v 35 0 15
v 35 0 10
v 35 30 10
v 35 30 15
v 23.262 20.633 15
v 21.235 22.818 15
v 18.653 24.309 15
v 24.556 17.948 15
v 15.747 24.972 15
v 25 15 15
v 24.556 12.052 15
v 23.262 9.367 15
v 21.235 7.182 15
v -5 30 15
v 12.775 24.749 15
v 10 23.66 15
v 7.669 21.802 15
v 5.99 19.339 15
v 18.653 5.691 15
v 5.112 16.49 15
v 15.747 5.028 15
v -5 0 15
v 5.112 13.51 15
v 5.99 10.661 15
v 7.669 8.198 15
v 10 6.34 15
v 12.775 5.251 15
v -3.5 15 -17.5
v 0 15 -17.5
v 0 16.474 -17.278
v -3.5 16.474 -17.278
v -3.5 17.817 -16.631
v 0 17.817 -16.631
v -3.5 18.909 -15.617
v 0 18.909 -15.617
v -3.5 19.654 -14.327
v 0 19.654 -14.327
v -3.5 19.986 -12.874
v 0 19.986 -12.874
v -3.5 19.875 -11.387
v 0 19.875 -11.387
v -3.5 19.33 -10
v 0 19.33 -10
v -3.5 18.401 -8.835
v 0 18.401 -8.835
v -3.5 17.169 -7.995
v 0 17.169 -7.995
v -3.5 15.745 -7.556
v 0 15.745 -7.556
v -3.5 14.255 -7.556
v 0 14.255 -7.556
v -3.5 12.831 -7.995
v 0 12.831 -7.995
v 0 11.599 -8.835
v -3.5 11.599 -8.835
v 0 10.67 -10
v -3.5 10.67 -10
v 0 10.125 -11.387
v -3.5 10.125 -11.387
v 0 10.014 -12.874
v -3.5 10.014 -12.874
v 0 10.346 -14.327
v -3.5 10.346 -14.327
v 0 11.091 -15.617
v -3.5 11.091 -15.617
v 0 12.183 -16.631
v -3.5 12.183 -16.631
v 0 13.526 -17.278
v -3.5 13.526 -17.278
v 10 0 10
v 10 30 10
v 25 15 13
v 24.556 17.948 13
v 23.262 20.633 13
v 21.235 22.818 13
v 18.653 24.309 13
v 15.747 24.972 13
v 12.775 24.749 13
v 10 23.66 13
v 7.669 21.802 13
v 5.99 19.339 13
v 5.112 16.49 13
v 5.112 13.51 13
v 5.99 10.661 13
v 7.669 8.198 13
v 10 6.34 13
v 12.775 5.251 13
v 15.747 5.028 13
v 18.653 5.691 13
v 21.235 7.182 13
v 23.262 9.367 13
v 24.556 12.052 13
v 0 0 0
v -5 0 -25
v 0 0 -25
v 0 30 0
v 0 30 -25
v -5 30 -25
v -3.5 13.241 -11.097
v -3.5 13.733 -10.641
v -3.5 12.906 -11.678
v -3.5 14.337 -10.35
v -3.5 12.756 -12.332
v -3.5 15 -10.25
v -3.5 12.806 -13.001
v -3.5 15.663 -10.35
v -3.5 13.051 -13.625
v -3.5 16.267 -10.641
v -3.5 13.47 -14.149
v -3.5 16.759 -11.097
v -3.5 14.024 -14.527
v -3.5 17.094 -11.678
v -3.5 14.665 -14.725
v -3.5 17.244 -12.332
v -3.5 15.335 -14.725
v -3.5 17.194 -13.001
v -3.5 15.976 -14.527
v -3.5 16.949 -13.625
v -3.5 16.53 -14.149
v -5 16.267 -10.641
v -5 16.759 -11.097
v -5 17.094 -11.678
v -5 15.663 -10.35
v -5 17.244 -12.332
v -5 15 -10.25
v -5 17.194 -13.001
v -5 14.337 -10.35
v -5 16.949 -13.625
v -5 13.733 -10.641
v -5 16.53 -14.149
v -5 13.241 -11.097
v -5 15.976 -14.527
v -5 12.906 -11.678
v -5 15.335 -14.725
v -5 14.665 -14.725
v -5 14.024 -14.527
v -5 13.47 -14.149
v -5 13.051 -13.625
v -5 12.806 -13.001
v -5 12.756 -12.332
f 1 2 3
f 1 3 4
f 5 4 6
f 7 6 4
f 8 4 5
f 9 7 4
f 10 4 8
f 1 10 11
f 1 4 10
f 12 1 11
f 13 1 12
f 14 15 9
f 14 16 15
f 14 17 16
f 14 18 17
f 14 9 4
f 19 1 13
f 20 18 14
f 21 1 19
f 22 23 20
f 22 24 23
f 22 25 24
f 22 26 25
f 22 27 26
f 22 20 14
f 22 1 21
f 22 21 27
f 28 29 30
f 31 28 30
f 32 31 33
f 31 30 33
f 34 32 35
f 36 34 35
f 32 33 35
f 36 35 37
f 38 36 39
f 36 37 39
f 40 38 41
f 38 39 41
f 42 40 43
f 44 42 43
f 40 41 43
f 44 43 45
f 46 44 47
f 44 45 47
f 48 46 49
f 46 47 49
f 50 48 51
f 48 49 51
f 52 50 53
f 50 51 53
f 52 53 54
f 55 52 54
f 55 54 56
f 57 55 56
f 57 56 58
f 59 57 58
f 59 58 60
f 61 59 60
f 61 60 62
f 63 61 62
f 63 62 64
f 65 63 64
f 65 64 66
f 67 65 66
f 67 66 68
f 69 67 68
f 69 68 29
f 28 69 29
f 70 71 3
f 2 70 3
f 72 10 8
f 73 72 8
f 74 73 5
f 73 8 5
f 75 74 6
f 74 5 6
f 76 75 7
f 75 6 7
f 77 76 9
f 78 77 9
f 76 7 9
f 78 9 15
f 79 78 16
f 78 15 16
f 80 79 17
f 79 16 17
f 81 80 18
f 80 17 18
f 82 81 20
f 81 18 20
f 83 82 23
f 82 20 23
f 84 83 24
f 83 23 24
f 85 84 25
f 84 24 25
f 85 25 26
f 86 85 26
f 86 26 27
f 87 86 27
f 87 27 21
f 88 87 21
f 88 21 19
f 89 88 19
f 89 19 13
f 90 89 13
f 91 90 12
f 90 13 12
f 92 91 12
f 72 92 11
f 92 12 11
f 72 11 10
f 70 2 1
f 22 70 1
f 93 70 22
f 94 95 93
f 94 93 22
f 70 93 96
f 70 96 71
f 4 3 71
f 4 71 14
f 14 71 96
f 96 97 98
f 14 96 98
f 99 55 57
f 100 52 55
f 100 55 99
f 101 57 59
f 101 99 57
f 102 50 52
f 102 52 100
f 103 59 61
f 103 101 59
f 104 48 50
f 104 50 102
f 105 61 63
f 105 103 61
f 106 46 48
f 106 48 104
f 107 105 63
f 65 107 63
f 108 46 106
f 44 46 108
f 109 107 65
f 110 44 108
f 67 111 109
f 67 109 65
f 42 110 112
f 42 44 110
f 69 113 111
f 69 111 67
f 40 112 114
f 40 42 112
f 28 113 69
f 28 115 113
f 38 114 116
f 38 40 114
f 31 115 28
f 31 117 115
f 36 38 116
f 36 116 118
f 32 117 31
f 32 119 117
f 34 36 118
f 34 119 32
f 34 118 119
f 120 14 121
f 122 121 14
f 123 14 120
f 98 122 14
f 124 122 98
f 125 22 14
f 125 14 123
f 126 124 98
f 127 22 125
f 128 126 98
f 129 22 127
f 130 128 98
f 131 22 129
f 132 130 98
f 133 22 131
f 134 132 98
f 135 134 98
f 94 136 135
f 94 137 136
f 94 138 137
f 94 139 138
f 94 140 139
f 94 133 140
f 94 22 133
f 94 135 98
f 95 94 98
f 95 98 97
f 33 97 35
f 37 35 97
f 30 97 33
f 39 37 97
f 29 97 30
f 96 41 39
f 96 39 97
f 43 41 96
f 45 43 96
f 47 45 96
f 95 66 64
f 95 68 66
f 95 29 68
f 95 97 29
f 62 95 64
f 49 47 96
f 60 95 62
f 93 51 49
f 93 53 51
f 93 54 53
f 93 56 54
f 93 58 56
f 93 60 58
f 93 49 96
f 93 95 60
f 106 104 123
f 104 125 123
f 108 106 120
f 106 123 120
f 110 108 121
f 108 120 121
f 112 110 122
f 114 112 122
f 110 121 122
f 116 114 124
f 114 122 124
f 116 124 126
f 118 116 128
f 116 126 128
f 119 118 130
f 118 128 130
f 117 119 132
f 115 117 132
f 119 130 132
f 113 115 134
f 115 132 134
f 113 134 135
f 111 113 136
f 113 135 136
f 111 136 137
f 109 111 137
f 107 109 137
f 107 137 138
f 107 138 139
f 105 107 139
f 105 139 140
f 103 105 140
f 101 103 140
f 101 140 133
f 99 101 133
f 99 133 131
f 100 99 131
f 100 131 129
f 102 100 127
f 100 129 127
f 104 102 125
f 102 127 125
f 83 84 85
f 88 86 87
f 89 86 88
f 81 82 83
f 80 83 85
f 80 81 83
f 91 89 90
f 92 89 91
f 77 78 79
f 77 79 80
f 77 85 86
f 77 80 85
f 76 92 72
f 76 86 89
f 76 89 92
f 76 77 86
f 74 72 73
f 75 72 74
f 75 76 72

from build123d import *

# Parameters (mm, degrees)
ESTRUSIONE_ESTRUSIONE2_DEPTH                         = 30
FORO_LAMATO_PER_VITE_M4_A_TESTA_CILINDRI_D           = 4.5
FORO_LAMATO_PER_VITE_M4_A_TESTA_CILINDRI_DEPTH       = 15
FORO_LAMATO_PER_VITE_M4_A_TESTA_CILINDRI_CBORE_D     = 10
FORO_LAMATO_PER_VITE_M4_A_TESTA_CILINDRI_CBORE_DEPTH = 3.5
FORO_LAMATO_PER_VITE_M4_A_TESTA_CILINDRI_TIP         = 1.351936393
SCHIZZO6_R                                           = 10
TAGLIO_ESTRUSIONE1_DEPTH                             = 2


with BuildPart() as part:
    # Schizzo2 → Estrusione-Estrusione2 (new body)
    with BuildSketch(Plane(origin=(0, 0, 0), x_dir=(1, 0, 0), z_dir=(0, 1, 0))):
        Polygon((0, 25), (0, 0), (10, -10), (35, -10), (35, -15), (-5, -15), (-5, 25), align=None)
    extrude(amount=ESTRUSIONE_ESTRUSIONE2_DEPTH)

    # Foro lamato per Vite M4 a testa cilindrica piana-1
    with Locations(Plane(origin=(0, 0, 0), x_dir=(0, 0, -1), z_dir=(1, 0, 0))):
        with Locations((12.5, 15)):
            CounterBoreHole(FORO_LAMATO_PER_VITE_M4_A_TESTA_CILINDRI_D / 2, FORO_LAMATO_PER_VITE_M4_A_TESTA_CILINDRI_CBORE_D / 2, FORO_LAMATO_PER_VITE_M4_A_TESTA_CILINDRI_CBORE_DEPTH, depth=FORO_LAMATO_PER_VITE_M4_A_TESTA_CILINDRI_DEPTH)
            with Locations((0, 0, -(FORO_LAMATO_PER_VITE_M4_A_TESTA_CILINDRI_DEPTH + FORO_LAMATO_PER_VITE_M4_A_TESTA_CILINDRI_TIP / 2))):  # 118° drill point
                Cone(0, FORO_LAMATO_PER_VITE_M4_A_TESTA_CILINDRI_D / 2, FORO_LAMATO_PER_VITE_M4_A_TESTA_CILINDRI_TIP, mode=Mode.SUBTRACT)

    # Schizzo6 → Taglio-Estrusione1 (cut)
    with BuildSketch(Plane.XY.offset(15)):
        with Locations((15, 15)):
            Circle(SCHIZZO6_R)
    extrude(amount=-TAGLIO_ESTRUSIONE1_DEPTH, mode=Mode.SUBTRACT)


solid = part.part
